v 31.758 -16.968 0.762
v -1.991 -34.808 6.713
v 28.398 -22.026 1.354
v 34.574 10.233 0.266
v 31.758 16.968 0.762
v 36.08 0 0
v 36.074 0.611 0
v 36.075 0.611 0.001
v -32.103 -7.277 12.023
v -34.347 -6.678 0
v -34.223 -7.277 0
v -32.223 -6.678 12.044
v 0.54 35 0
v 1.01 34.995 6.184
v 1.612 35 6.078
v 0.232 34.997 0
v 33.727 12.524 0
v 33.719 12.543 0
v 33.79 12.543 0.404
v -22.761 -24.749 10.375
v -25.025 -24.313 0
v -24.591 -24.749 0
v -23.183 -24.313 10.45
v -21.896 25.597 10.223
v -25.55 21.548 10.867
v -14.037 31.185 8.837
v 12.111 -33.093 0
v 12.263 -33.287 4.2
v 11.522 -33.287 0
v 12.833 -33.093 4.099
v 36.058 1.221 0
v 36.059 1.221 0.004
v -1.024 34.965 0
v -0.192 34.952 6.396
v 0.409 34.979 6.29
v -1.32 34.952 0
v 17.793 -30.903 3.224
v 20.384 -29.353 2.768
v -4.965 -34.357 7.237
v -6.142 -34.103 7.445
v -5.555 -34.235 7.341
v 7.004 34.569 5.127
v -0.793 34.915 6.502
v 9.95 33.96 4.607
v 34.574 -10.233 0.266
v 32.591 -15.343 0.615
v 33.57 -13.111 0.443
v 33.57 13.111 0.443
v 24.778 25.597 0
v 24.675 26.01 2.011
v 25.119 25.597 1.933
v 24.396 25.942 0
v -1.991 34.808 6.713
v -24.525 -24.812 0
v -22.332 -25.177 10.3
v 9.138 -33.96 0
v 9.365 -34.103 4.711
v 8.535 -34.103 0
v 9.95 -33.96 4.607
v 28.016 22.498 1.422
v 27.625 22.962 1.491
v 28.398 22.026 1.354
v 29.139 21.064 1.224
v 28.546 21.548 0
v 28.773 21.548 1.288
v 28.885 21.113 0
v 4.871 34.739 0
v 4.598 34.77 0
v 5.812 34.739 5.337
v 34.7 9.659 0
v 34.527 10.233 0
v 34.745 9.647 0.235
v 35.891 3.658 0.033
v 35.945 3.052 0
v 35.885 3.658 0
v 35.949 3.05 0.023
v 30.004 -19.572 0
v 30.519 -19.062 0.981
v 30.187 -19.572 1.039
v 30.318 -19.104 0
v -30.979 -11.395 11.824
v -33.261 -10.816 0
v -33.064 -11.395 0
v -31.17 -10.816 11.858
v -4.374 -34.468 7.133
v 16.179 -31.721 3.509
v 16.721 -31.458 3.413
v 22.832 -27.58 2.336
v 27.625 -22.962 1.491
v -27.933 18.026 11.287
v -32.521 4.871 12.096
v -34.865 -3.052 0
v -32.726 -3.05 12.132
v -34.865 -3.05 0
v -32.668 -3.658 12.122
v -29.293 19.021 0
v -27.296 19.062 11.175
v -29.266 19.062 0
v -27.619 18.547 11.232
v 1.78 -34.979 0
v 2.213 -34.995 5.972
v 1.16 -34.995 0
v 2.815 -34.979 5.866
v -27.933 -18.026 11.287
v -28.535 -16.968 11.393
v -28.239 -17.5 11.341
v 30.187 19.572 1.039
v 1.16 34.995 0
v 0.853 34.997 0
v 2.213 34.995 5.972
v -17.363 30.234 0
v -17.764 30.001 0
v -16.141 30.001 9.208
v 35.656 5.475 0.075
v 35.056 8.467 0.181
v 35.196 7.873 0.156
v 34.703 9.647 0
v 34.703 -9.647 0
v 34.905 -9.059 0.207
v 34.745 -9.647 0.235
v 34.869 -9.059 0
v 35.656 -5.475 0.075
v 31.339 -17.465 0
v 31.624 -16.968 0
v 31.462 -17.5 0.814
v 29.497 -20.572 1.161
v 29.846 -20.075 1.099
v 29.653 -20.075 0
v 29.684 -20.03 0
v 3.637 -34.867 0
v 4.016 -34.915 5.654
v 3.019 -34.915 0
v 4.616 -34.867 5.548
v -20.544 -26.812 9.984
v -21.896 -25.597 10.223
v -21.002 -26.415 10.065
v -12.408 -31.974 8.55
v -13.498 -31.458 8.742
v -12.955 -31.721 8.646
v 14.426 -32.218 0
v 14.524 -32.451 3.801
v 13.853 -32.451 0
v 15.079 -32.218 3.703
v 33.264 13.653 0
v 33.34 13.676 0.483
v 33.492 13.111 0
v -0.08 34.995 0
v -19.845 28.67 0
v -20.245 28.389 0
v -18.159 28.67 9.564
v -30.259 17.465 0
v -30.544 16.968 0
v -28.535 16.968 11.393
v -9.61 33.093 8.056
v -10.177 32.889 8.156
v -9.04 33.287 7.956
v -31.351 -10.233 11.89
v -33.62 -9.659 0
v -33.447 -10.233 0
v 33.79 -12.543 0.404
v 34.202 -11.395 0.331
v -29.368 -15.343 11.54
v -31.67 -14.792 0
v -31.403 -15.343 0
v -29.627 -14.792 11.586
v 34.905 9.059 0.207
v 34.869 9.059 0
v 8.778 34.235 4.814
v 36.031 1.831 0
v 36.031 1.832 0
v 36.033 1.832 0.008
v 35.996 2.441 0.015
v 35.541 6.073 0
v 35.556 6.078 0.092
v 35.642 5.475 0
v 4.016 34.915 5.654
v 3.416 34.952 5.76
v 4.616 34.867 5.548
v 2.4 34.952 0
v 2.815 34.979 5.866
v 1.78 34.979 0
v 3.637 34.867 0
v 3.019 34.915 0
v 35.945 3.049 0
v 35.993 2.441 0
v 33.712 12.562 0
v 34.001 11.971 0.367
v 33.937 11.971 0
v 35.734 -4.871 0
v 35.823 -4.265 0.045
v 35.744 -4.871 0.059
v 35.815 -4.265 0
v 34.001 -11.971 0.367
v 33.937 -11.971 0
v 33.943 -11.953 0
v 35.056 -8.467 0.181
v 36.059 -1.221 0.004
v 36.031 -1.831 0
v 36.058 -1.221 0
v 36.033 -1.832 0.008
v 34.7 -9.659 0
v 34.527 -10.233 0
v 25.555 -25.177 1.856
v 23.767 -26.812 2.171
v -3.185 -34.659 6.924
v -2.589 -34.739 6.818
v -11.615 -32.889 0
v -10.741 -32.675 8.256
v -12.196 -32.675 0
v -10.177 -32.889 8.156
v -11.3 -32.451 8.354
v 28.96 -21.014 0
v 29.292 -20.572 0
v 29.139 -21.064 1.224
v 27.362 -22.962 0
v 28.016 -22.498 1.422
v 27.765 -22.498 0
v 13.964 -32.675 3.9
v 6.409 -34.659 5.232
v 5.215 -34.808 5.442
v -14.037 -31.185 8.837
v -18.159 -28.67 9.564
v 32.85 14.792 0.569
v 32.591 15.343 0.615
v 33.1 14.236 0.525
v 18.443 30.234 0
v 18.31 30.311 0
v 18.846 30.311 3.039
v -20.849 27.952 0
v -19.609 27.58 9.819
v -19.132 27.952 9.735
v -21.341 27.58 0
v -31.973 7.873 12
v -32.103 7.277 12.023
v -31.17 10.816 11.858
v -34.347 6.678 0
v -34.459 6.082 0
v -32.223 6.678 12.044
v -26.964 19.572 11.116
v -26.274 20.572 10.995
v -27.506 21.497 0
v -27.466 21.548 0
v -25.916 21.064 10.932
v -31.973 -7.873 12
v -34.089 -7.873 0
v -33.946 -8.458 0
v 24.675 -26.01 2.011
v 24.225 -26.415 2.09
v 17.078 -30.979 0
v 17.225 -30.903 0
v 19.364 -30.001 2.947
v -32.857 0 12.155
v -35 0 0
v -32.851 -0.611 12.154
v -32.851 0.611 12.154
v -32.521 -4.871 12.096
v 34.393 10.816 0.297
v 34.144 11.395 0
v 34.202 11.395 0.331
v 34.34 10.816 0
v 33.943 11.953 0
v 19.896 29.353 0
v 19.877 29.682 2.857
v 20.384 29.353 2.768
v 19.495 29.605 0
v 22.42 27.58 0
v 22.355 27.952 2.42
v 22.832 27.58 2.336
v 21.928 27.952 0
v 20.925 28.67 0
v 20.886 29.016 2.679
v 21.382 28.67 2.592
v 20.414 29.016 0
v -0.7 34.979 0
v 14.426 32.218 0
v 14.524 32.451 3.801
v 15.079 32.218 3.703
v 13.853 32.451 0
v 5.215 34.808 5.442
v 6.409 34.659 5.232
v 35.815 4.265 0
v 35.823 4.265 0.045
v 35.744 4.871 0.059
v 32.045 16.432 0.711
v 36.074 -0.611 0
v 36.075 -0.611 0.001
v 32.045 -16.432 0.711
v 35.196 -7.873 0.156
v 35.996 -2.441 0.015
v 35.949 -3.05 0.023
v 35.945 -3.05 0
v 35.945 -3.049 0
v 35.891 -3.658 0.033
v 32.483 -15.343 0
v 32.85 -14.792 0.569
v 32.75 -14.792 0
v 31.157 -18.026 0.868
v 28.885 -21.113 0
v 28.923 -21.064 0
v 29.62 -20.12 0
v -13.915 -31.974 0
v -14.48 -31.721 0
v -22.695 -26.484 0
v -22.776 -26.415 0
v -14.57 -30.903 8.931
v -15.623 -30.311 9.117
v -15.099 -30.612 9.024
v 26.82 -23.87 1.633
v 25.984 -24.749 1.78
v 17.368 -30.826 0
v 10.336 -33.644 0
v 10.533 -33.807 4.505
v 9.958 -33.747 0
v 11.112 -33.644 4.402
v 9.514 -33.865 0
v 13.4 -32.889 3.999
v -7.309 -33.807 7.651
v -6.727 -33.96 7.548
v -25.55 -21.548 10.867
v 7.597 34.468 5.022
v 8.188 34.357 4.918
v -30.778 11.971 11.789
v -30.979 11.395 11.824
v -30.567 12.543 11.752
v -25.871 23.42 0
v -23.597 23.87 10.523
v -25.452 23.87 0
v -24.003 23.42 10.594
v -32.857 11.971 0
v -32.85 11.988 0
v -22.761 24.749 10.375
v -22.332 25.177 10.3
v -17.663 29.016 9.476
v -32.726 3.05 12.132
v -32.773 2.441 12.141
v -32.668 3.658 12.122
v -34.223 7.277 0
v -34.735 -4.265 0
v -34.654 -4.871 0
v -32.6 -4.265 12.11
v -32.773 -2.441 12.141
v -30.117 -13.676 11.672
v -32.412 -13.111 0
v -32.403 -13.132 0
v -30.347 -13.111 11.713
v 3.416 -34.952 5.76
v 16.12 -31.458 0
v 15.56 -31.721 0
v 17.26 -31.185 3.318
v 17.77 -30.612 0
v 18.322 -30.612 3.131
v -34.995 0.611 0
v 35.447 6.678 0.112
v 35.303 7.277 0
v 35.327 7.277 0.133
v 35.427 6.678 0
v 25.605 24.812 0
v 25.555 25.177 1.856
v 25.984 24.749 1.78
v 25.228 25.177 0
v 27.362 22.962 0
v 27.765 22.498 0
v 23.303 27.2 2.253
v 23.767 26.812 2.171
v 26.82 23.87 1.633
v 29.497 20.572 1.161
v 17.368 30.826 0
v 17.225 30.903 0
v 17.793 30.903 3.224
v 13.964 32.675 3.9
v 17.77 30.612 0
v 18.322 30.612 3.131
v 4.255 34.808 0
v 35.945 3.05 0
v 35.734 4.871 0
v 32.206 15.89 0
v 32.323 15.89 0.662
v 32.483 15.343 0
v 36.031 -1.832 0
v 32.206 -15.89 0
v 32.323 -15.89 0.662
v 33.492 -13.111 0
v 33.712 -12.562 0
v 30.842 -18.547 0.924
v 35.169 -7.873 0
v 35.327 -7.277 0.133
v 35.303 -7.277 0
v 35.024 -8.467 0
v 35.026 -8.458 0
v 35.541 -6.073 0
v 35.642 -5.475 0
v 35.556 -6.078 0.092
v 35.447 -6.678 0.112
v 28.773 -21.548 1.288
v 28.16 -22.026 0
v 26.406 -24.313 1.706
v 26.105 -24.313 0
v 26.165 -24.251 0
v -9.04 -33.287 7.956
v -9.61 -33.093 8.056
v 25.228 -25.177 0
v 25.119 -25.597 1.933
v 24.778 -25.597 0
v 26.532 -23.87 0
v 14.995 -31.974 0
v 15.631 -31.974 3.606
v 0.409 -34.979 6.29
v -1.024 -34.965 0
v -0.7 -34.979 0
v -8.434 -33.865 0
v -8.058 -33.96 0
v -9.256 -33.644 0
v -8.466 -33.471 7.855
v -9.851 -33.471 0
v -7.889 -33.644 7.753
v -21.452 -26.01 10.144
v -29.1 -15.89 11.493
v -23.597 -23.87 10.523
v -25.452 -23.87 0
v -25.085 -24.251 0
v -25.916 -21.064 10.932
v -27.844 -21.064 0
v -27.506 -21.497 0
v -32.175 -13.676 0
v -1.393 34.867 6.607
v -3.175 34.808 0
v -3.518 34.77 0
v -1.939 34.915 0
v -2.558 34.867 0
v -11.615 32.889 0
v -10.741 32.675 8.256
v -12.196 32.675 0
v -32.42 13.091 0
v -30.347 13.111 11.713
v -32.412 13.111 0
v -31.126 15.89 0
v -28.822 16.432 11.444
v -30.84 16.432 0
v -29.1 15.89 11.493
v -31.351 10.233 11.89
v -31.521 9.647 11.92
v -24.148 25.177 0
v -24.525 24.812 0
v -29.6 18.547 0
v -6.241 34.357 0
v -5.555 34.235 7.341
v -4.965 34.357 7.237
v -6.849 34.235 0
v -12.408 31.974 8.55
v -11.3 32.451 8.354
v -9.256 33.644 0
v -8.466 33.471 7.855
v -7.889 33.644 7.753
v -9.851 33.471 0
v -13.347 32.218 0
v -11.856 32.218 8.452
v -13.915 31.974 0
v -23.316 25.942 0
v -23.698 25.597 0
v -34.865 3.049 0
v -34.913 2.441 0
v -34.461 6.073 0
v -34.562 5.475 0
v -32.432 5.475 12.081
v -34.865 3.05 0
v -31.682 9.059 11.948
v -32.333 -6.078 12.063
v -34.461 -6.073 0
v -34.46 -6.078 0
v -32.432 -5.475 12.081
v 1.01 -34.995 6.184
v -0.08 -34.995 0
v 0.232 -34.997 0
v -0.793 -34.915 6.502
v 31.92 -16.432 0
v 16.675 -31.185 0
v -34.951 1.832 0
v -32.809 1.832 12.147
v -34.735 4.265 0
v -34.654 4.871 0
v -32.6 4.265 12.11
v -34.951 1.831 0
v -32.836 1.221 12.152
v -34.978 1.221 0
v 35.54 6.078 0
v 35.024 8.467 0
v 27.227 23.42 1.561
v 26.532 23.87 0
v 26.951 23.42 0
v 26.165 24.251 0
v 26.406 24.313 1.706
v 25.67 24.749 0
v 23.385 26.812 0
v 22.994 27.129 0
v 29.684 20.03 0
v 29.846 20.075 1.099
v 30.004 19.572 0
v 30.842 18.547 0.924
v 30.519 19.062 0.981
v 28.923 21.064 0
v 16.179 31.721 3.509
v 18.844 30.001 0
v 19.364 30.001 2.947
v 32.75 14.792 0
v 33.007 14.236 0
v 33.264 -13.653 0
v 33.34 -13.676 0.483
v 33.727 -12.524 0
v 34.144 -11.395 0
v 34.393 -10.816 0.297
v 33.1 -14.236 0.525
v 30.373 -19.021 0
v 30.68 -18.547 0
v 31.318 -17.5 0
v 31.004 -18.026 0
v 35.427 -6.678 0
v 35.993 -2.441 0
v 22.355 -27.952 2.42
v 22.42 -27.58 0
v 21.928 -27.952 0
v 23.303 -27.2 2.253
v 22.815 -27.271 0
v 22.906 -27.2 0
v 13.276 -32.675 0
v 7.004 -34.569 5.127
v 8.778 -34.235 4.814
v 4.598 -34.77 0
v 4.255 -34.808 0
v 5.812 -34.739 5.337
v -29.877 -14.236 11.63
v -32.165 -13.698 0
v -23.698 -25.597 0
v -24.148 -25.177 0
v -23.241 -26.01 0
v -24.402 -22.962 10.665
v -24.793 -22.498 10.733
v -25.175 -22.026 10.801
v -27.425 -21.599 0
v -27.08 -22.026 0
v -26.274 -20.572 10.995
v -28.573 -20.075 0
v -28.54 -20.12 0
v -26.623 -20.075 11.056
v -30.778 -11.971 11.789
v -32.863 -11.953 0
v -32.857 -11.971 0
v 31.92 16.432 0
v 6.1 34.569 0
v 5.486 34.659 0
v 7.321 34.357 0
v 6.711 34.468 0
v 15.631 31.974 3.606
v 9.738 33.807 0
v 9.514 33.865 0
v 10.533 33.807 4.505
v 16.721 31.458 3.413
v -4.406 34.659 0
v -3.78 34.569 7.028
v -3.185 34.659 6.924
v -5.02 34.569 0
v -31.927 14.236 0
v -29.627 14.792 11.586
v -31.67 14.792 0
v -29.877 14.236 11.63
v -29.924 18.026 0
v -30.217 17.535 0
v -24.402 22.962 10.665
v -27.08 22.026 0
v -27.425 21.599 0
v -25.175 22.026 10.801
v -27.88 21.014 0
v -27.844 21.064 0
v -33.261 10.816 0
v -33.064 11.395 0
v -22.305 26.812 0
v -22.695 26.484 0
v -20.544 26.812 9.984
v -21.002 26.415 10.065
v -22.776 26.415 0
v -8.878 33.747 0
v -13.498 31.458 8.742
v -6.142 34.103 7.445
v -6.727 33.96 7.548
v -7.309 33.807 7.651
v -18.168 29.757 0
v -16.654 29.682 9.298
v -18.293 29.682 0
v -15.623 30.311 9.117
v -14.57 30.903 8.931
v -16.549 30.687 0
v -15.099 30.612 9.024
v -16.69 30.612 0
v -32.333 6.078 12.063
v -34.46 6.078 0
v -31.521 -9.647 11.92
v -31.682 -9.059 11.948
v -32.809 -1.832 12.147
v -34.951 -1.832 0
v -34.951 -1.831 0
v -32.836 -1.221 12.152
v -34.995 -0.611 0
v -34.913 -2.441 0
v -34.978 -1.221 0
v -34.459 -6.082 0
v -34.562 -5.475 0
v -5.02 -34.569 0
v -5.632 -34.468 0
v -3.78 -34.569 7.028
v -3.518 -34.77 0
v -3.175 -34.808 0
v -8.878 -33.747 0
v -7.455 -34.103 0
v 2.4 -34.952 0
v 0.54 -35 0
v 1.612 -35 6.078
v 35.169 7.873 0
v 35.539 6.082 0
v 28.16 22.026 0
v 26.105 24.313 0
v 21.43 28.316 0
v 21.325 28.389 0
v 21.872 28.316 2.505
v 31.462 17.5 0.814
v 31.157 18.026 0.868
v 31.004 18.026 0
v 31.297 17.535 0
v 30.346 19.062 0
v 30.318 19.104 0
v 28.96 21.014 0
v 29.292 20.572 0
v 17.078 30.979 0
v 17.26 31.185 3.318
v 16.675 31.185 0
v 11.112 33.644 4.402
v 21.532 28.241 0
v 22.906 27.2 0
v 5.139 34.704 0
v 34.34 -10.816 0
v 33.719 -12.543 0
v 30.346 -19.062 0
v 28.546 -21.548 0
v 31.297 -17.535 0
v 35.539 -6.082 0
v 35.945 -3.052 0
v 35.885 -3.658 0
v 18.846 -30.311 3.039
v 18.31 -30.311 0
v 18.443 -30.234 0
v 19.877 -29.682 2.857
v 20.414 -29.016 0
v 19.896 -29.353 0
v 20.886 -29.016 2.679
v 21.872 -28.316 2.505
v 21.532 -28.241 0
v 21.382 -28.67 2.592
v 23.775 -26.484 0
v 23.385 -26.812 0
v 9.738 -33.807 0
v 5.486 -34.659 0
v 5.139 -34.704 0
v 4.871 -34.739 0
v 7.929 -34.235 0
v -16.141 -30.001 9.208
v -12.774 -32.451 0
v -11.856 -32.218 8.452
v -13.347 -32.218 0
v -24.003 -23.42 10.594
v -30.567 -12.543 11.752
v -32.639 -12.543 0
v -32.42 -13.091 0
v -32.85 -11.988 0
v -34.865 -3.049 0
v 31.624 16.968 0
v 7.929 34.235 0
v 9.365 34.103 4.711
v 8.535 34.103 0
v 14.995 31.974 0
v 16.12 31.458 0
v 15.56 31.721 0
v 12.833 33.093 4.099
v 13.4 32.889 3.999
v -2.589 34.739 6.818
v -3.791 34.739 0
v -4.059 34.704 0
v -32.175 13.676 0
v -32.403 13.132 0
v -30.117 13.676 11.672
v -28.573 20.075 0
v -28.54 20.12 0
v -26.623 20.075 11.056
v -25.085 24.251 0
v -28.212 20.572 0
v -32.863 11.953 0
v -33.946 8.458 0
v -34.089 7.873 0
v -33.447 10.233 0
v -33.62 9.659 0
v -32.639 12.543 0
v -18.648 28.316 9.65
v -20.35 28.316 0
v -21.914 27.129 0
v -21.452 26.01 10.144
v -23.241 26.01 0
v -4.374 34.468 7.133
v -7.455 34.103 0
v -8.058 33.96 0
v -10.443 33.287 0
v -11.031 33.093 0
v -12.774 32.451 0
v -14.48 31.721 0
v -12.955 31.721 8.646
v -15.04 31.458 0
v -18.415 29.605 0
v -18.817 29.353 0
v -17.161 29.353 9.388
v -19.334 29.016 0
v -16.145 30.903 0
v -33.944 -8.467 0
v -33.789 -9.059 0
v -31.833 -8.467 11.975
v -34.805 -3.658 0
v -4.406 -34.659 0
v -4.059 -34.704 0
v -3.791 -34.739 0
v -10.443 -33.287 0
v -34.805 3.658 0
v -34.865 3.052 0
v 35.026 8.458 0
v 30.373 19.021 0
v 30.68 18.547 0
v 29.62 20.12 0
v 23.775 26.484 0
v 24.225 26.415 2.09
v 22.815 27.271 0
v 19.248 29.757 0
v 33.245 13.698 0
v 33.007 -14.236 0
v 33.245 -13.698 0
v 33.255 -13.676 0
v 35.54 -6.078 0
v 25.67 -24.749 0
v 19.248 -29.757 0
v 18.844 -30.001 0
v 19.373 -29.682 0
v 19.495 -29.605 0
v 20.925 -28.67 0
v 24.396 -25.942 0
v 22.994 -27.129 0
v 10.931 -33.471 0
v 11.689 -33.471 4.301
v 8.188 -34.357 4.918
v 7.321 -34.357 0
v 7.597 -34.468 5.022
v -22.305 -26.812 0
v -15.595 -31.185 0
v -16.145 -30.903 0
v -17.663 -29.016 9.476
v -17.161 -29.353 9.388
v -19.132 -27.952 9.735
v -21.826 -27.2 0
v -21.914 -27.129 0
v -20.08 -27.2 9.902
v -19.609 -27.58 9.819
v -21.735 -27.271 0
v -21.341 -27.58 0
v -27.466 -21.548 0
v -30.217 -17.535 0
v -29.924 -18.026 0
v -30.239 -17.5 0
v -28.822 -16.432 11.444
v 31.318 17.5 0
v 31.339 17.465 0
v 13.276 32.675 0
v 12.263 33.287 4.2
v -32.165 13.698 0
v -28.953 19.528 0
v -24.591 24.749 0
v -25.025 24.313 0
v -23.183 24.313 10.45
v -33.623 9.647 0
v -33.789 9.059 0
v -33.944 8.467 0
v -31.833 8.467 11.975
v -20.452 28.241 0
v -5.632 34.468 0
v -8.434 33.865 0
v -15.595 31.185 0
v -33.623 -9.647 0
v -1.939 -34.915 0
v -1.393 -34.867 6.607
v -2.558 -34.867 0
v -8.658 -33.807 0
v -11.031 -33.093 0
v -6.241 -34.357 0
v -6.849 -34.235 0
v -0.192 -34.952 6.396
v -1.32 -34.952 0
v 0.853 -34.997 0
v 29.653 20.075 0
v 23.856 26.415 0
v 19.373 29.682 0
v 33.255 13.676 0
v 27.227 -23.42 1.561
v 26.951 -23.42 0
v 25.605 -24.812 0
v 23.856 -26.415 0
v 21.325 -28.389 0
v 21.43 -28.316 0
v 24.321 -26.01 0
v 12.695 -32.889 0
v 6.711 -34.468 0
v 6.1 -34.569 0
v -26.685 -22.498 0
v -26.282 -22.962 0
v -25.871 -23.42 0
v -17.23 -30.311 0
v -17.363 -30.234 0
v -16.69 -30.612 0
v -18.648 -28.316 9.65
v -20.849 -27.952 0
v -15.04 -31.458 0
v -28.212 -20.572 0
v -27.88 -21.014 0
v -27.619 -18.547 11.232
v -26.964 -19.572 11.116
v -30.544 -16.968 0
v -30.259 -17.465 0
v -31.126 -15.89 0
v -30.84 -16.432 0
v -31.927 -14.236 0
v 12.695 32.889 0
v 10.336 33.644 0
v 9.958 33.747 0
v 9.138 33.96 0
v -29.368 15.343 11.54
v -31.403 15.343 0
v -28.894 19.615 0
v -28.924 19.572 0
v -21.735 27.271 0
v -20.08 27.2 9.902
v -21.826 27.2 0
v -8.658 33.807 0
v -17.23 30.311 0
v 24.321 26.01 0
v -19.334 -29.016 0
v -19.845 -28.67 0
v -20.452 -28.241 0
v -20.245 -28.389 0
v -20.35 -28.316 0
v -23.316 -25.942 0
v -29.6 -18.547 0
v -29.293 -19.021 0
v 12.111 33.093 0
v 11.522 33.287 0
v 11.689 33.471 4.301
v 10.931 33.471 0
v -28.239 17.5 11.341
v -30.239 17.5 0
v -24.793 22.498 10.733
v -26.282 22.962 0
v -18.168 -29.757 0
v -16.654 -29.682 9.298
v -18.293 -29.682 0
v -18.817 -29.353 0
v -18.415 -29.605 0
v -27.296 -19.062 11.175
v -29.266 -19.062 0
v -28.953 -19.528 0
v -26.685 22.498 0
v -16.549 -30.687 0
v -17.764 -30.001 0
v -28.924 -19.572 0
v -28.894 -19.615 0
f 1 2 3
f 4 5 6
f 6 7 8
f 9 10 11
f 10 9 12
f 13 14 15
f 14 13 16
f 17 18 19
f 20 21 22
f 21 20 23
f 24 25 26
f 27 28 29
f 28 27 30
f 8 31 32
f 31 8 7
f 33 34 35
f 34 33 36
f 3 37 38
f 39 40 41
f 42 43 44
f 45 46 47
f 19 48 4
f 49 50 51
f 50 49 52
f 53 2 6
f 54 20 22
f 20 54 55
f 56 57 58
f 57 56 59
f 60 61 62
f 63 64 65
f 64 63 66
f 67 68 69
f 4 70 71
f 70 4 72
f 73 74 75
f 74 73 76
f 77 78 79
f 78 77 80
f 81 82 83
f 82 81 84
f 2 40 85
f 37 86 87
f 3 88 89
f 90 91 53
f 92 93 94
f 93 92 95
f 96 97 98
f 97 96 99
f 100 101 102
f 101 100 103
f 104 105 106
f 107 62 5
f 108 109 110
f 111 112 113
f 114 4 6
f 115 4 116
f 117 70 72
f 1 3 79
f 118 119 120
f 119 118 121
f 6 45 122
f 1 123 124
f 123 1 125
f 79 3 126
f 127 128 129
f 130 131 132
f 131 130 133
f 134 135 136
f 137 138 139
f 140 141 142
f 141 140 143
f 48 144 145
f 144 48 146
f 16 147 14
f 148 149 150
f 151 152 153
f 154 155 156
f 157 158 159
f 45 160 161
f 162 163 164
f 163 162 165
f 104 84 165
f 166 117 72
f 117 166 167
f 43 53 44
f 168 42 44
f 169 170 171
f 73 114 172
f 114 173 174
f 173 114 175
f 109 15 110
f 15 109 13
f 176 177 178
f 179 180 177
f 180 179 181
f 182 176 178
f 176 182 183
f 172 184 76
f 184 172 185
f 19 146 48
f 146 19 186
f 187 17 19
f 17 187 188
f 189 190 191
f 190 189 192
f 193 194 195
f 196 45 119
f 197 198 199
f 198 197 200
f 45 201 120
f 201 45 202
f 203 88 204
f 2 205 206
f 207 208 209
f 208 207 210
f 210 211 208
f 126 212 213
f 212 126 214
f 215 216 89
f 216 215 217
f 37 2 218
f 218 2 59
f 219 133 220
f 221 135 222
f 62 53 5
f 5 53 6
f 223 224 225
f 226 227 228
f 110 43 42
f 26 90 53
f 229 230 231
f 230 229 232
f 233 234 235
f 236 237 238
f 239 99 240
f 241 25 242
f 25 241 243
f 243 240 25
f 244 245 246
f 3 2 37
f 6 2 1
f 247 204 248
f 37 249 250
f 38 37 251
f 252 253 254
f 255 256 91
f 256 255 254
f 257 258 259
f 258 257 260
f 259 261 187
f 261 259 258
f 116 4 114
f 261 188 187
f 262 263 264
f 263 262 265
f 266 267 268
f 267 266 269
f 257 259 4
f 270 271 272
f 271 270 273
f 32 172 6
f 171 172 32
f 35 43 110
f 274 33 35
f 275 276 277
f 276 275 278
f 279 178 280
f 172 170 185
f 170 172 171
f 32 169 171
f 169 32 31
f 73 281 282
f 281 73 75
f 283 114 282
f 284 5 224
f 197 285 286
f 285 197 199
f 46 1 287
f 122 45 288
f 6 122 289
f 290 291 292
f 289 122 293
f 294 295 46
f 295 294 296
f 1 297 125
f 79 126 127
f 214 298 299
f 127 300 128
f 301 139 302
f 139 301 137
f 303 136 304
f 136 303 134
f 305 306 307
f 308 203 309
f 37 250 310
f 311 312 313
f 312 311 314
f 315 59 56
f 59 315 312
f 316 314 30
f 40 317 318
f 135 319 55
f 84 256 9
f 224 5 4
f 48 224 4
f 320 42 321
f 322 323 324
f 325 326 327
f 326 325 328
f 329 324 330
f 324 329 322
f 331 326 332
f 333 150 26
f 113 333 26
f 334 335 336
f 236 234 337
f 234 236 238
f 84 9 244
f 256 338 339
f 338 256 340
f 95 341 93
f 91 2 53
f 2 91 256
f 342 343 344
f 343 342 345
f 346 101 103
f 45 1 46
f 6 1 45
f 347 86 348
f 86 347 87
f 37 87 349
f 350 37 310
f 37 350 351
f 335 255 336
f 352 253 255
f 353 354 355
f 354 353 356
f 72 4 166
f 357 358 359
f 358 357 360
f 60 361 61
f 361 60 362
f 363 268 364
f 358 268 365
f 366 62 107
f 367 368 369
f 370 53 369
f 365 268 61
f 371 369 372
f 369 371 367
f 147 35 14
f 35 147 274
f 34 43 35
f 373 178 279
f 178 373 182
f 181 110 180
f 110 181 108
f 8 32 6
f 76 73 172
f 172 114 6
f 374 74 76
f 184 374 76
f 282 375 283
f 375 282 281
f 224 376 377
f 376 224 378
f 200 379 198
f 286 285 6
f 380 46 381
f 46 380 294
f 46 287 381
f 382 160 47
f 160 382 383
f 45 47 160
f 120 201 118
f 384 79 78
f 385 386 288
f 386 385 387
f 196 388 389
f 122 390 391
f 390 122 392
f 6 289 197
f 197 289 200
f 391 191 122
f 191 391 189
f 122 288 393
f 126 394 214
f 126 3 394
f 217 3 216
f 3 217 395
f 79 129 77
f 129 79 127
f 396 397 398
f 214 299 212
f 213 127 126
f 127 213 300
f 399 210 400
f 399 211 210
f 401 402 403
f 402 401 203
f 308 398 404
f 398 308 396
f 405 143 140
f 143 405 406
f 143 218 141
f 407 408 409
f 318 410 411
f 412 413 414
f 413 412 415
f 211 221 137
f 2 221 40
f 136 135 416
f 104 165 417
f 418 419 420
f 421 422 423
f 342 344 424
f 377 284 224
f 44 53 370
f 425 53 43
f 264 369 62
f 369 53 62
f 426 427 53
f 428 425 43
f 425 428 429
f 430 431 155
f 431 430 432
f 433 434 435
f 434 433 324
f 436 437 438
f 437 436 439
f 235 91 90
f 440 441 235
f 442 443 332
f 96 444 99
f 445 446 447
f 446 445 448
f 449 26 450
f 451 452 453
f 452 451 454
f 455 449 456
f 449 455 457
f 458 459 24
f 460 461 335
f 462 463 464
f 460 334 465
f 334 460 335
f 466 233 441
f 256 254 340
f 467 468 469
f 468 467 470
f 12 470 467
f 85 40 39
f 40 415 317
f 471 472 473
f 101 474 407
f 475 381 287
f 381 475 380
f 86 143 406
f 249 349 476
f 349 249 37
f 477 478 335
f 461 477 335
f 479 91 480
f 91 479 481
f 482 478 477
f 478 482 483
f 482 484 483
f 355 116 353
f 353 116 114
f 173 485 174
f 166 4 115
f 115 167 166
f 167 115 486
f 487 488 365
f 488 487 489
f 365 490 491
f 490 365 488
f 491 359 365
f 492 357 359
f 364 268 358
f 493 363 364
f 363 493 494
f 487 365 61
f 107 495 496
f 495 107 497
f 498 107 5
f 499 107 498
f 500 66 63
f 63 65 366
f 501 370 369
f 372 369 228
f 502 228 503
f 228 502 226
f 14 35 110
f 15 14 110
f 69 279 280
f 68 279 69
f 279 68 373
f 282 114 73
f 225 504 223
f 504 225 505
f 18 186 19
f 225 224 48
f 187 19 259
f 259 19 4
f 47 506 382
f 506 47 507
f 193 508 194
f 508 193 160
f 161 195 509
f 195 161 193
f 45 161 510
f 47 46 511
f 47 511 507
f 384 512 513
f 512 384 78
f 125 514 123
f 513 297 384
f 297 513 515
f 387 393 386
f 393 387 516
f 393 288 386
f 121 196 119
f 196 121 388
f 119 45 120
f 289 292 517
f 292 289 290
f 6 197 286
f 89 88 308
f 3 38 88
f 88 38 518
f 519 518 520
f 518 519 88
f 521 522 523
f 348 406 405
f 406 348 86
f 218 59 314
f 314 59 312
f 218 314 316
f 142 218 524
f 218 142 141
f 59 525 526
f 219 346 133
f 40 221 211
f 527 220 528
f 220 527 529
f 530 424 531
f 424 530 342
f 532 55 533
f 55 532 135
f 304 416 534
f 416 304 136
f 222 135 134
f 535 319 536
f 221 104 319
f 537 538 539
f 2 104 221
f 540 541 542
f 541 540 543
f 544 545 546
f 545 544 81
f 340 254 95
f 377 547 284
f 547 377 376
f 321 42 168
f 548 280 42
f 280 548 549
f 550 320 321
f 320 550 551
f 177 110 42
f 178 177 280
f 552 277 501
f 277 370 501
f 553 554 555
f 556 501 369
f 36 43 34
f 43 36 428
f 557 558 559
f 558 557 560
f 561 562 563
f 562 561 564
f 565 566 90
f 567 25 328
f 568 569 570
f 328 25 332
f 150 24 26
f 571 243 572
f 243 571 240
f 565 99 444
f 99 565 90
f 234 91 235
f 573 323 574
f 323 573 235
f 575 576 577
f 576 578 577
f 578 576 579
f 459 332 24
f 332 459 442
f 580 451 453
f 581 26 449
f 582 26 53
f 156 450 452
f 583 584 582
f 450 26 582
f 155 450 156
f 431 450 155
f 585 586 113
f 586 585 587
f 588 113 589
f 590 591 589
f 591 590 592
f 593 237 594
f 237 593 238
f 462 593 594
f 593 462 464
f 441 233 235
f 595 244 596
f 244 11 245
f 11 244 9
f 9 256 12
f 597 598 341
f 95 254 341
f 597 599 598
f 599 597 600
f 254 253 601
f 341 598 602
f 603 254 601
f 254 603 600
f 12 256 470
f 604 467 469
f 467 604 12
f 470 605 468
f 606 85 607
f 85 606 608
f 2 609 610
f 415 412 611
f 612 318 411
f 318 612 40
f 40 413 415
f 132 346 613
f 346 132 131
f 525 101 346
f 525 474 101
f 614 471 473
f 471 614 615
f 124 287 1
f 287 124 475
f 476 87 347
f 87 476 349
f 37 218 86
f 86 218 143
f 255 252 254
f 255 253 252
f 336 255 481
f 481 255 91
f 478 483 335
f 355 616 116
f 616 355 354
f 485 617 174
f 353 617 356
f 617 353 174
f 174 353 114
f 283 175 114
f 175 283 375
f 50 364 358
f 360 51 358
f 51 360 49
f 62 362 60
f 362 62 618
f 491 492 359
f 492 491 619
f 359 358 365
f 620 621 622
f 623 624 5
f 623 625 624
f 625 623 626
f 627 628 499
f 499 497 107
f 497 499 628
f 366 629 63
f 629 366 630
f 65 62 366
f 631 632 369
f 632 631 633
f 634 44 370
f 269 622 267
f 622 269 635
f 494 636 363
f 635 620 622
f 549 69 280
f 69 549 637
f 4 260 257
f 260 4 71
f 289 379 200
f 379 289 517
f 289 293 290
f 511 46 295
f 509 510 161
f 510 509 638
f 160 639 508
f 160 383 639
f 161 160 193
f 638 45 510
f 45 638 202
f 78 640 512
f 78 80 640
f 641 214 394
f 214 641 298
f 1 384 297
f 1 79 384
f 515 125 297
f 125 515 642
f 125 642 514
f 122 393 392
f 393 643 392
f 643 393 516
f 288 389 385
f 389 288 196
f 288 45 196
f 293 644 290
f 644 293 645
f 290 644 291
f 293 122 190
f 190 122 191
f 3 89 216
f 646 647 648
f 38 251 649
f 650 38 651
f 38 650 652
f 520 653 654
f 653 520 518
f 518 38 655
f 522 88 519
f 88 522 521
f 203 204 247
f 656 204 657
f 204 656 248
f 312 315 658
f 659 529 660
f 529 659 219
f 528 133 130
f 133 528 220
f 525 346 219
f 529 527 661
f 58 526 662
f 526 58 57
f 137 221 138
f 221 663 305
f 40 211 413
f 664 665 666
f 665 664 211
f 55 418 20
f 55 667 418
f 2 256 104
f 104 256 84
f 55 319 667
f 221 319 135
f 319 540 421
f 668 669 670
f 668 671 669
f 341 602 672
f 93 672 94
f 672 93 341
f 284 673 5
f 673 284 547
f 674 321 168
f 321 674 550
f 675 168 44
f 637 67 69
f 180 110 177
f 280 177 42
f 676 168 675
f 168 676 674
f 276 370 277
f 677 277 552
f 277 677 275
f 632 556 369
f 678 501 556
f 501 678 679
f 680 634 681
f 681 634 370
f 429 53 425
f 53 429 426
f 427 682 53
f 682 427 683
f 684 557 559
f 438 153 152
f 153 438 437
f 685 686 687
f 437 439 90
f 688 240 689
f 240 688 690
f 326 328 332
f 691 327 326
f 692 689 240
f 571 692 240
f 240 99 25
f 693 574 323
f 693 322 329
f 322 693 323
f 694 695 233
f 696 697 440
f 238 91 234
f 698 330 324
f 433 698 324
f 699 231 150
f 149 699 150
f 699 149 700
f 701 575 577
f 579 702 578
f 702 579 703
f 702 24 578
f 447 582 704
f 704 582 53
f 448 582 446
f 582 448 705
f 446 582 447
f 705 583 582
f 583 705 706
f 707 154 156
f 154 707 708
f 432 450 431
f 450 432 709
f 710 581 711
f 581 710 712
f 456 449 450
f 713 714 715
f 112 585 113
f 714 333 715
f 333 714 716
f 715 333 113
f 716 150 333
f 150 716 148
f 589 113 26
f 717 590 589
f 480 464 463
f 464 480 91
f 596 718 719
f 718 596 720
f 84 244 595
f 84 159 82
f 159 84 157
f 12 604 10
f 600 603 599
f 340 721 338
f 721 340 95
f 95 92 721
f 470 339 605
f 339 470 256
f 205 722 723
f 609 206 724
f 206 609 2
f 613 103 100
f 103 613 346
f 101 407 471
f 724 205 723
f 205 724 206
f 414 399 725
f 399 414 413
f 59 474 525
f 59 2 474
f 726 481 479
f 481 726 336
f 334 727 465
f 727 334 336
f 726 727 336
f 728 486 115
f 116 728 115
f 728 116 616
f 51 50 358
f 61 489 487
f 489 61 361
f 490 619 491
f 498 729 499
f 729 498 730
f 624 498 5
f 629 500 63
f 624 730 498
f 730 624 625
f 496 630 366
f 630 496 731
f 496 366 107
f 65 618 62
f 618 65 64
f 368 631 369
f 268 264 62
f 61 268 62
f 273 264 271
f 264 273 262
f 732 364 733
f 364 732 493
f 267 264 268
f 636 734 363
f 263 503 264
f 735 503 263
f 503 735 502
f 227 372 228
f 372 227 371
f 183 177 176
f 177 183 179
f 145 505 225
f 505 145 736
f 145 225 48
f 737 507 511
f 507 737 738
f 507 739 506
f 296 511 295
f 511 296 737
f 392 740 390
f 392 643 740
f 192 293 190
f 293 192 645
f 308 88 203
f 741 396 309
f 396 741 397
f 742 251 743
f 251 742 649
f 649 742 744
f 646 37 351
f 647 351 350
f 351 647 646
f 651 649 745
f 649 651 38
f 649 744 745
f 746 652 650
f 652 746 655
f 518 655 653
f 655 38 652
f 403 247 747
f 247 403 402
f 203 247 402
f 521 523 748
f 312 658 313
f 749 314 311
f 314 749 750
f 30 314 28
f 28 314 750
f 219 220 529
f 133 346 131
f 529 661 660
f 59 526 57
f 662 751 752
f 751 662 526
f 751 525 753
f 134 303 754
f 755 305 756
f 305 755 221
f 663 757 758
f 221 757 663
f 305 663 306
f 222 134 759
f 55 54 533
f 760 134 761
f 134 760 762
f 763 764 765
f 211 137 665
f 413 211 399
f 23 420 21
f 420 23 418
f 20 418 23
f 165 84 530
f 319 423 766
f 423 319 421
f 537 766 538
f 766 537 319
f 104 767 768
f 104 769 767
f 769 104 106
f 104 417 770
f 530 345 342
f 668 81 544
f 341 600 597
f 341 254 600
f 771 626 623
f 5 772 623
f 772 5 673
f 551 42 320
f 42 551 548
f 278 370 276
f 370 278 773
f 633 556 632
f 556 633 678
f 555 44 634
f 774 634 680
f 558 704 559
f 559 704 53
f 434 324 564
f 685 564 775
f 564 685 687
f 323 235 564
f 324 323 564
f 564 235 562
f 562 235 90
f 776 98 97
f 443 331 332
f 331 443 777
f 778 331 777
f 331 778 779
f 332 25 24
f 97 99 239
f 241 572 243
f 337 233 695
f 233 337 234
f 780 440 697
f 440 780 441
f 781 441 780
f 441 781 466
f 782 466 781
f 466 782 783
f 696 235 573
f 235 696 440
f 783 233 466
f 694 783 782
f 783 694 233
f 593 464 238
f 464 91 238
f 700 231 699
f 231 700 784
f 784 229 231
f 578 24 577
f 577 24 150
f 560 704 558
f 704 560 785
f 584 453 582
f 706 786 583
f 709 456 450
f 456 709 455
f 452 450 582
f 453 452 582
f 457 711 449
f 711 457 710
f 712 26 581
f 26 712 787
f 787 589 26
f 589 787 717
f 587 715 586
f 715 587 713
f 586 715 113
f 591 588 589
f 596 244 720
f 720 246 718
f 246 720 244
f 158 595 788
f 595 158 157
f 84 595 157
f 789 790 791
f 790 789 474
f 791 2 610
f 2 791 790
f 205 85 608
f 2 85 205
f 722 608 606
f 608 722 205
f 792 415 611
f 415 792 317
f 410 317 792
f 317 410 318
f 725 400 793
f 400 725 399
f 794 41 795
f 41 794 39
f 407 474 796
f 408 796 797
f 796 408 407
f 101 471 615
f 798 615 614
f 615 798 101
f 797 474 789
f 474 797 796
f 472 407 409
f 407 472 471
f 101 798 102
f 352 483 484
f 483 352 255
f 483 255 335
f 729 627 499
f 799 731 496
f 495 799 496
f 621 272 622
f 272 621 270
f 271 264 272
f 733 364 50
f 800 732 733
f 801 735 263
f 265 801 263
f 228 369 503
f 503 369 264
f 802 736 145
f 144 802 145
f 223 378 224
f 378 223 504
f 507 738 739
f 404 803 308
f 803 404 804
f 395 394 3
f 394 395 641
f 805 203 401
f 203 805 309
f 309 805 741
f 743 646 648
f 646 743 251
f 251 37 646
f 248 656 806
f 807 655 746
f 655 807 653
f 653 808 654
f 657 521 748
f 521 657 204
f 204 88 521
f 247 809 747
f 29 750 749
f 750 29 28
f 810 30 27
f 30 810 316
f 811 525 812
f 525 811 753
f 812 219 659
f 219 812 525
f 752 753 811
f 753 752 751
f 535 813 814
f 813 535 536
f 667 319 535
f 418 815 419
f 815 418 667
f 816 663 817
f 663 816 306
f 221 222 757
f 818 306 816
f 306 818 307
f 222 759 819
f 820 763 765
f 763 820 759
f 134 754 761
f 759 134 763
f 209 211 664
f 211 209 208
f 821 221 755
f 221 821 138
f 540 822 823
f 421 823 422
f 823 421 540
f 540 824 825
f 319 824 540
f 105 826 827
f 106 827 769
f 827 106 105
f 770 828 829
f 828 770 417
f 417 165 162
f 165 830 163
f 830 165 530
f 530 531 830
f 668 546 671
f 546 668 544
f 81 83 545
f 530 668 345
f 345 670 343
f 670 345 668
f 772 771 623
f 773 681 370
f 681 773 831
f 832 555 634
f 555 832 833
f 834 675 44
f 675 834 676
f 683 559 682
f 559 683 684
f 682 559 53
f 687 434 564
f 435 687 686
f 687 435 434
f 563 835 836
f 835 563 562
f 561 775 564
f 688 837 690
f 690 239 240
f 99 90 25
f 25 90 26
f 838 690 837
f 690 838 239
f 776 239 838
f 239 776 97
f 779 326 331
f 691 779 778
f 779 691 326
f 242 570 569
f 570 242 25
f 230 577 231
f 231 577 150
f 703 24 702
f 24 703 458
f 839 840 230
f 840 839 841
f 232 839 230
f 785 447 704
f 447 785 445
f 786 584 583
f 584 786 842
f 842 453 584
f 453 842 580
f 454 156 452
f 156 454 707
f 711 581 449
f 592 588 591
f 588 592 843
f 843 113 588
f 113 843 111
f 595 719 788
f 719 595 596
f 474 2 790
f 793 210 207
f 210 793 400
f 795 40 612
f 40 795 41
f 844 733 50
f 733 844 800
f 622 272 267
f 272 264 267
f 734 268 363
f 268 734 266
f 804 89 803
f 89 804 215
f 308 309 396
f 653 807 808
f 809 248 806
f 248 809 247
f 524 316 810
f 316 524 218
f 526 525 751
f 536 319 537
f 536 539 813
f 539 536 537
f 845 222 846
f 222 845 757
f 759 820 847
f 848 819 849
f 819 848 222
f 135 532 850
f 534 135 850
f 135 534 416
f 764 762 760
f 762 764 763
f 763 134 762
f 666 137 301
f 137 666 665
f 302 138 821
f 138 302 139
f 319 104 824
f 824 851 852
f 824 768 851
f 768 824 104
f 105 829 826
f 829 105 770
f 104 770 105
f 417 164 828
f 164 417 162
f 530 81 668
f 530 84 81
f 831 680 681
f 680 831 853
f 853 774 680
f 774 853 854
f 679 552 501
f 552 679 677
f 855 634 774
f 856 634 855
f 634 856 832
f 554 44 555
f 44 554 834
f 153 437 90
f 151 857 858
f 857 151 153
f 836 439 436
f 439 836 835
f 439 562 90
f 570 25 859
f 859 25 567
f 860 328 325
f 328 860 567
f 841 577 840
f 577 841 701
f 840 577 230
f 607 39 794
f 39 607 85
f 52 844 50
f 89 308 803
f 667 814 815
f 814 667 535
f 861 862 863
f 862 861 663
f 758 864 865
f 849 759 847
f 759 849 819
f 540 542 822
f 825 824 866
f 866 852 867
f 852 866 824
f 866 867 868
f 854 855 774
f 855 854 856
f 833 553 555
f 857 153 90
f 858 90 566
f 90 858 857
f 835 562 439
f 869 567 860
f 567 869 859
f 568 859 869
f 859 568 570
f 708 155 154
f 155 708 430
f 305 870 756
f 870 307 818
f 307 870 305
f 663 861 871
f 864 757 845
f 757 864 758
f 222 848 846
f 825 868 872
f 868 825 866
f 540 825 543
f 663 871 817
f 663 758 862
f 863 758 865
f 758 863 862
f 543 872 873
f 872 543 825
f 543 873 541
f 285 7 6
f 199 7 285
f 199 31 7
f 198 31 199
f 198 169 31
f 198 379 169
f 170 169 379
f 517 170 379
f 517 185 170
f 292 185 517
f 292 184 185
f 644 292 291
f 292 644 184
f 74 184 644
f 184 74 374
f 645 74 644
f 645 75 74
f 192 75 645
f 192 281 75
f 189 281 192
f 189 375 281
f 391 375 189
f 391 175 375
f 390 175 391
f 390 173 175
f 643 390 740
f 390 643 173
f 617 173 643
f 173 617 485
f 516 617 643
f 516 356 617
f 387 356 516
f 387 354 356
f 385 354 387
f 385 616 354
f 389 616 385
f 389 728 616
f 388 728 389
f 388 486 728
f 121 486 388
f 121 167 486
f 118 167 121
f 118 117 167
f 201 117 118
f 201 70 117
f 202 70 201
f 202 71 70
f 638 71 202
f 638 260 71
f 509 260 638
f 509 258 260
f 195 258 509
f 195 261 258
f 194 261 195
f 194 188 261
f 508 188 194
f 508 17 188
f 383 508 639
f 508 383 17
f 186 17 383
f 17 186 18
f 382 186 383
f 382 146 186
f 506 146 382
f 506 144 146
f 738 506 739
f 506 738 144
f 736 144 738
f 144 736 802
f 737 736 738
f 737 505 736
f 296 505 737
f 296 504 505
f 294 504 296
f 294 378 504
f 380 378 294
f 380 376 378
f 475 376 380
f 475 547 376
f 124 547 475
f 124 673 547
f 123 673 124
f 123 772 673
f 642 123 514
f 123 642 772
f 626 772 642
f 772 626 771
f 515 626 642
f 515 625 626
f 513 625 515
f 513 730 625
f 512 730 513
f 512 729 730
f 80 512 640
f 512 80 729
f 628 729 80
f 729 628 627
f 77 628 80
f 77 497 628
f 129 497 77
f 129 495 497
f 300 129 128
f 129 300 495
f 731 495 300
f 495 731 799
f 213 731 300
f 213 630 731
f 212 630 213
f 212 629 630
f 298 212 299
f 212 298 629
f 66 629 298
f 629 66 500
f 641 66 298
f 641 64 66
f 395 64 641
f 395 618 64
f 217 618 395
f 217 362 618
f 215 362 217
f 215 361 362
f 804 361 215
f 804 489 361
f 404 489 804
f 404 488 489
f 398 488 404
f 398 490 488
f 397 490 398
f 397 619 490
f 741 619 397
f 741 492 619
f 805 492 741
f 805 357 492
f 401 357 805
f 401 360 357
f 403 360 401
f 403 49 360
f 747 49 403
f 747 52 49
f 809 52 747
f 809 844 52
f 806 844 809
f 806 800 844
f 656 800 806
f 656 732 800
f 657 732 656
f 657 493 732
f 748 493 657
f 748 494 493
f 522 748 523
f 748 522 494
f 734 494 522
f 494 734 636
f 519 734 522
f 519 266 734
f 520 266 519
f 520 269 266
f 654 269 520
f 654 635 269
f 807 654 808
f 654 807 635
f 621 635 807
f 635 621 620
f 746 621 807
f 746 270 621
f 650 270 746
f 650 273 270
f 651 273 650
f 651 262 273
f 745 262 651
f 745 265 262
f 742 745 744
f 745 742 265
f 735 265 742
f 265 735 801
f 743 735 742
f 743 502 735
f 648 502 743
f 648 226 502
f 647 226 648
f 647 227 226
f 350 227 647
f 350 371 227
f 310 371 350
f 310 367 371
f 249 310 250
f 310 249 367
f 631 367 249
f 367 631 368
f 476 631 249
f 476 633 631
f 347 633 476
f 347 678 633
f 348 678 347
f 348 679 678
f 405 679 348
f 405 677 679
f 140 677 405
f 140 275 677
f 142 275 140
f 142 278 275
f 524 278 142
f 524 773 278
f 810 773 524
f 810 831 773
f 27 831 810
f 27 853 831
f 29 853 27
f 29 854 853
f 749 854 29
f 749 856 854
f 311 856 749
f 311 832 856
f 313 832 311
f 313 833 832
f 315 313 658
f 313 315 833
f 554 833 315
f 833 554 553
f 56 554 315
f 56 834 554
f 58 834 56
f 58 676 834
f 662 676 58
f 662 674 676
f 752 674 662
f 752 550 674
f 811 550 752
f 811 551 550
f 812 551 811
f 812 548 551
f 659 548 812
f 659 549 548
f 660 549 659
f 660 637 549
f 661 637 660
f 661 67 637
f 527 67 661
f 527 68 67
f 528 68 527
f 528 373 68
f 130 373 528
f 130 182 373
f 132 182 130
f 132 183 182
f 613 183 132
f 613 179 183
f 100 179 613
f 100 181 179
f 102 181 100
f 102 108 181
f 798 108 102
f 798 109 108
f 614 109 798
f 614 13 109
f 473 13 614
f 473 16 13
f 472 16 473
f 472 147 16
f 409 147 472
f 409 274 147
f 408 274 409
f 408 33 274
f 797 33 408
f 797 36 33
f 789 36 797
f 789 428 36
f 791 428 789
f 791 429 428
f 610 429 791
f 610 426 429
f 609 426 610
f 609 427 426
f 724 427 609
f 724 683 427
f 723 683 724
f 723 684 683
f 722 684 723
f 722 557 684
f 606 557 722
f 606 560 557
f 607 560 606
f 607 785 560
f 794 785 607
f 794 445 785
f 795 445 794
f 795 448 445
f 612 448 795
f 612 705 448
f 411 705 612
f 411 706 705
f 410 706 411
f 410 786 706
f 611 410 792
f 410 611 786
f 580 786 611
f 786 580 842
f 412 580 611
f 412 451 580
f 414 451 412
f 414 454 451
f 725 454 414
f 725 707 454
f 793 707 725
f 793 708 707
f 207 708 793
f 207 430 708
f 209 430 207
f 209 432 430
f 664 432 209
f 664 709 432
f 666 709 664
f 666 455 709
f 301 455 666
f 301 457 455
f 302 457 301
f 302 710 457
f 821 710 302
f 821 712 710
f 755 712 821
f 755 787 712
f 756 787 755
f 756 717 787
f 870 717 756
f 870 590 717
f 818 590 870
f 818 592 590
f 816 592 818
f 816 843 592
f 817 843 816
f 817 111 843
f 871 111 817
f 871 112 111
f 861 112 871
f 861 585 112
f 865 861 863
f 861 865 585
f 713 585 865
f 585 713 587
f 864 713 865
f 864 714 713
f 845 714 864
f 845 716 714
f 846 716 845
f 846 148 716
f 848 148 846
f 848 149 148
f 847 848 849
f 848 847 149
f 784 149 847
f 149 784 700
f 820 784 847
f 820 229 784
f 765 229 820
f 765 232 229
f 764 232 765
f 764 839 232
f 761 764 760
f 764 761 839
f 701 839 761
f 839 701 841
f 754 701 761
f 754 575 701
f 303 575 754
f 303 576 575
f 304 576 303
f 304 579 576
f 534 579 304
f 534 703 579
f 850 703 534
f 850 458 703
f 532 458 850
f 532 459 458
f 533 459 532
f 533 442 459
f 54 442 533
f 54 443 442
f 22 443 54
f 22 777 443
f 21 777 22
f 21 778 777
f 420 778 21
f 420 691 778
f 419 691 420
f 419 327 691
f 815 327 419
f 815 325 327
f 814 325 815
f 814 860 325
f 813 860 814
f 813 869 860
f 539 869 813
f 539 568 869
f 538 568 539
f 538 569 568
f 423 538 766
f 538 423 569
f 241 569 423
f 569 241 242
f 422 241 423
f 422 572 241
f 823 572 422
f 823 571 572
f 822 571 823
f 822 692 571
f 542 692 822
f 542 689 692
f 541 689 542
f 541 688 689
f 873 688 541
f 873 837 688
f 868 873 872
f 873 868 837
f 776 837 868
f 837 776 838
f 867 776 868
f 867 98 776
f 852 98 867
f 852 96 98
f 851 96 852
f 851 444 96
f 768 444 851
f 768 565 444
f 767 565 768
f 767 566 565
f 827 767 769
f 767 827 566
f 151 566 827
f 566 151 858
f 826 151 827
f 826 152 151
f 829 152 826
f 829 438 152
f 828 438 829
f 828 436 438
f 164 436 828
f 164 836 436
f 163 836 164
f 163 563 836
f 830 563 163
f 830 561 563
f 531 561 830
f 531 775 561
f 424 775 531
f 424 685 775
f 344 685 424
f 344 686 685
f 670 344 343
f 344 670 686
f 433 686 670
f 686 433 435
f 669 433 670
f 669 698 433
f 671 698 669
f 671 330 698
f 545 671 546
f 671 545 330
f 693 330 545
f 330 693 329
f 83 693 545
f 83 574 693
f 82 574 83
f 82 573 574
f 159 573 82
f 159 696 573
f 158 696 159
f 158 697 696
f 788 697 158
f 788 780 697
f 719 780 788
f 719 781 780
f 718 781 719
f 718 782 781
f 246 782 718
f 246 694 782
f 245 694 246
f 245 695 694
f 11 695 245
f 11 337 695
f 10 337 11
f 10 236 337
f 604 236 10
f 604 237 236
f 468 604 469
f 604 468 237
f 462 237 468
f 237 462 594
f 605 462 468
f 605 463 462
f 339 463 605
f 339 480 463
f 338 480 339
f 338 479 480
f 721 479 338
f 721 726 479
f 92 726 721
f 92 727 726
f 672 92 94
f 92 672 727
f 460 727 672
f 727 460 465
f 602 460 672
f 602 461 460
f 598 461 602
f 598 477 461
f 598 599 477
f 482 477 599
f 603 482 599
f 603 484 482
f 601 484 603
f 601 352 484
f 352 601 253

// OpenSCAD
//Measurements.
pot_radius = 35;
slope = 10;

//Settings.
$fa=1;
$fs=0.2;

//Computed globals.
height = sin(slope) * pot_radius * 2;
width = cos(slope) * pot_radius * 2 + 1 / cos(slope) * height;
cylinder_height = 1 / cos(slope) * height;

difference() {
	translate([-pot_radius, 0, 0]) {
		rotate([0, slope, 0]) {
			translate([pot_radius, 0, 0]) {
				cylinder(r=pot_radius, h=cylinder_height);
			}
		}
	}
	translate([-pot_radius, -pot_radius, -height]) {
		cube([width, width, height]);
	}
}
